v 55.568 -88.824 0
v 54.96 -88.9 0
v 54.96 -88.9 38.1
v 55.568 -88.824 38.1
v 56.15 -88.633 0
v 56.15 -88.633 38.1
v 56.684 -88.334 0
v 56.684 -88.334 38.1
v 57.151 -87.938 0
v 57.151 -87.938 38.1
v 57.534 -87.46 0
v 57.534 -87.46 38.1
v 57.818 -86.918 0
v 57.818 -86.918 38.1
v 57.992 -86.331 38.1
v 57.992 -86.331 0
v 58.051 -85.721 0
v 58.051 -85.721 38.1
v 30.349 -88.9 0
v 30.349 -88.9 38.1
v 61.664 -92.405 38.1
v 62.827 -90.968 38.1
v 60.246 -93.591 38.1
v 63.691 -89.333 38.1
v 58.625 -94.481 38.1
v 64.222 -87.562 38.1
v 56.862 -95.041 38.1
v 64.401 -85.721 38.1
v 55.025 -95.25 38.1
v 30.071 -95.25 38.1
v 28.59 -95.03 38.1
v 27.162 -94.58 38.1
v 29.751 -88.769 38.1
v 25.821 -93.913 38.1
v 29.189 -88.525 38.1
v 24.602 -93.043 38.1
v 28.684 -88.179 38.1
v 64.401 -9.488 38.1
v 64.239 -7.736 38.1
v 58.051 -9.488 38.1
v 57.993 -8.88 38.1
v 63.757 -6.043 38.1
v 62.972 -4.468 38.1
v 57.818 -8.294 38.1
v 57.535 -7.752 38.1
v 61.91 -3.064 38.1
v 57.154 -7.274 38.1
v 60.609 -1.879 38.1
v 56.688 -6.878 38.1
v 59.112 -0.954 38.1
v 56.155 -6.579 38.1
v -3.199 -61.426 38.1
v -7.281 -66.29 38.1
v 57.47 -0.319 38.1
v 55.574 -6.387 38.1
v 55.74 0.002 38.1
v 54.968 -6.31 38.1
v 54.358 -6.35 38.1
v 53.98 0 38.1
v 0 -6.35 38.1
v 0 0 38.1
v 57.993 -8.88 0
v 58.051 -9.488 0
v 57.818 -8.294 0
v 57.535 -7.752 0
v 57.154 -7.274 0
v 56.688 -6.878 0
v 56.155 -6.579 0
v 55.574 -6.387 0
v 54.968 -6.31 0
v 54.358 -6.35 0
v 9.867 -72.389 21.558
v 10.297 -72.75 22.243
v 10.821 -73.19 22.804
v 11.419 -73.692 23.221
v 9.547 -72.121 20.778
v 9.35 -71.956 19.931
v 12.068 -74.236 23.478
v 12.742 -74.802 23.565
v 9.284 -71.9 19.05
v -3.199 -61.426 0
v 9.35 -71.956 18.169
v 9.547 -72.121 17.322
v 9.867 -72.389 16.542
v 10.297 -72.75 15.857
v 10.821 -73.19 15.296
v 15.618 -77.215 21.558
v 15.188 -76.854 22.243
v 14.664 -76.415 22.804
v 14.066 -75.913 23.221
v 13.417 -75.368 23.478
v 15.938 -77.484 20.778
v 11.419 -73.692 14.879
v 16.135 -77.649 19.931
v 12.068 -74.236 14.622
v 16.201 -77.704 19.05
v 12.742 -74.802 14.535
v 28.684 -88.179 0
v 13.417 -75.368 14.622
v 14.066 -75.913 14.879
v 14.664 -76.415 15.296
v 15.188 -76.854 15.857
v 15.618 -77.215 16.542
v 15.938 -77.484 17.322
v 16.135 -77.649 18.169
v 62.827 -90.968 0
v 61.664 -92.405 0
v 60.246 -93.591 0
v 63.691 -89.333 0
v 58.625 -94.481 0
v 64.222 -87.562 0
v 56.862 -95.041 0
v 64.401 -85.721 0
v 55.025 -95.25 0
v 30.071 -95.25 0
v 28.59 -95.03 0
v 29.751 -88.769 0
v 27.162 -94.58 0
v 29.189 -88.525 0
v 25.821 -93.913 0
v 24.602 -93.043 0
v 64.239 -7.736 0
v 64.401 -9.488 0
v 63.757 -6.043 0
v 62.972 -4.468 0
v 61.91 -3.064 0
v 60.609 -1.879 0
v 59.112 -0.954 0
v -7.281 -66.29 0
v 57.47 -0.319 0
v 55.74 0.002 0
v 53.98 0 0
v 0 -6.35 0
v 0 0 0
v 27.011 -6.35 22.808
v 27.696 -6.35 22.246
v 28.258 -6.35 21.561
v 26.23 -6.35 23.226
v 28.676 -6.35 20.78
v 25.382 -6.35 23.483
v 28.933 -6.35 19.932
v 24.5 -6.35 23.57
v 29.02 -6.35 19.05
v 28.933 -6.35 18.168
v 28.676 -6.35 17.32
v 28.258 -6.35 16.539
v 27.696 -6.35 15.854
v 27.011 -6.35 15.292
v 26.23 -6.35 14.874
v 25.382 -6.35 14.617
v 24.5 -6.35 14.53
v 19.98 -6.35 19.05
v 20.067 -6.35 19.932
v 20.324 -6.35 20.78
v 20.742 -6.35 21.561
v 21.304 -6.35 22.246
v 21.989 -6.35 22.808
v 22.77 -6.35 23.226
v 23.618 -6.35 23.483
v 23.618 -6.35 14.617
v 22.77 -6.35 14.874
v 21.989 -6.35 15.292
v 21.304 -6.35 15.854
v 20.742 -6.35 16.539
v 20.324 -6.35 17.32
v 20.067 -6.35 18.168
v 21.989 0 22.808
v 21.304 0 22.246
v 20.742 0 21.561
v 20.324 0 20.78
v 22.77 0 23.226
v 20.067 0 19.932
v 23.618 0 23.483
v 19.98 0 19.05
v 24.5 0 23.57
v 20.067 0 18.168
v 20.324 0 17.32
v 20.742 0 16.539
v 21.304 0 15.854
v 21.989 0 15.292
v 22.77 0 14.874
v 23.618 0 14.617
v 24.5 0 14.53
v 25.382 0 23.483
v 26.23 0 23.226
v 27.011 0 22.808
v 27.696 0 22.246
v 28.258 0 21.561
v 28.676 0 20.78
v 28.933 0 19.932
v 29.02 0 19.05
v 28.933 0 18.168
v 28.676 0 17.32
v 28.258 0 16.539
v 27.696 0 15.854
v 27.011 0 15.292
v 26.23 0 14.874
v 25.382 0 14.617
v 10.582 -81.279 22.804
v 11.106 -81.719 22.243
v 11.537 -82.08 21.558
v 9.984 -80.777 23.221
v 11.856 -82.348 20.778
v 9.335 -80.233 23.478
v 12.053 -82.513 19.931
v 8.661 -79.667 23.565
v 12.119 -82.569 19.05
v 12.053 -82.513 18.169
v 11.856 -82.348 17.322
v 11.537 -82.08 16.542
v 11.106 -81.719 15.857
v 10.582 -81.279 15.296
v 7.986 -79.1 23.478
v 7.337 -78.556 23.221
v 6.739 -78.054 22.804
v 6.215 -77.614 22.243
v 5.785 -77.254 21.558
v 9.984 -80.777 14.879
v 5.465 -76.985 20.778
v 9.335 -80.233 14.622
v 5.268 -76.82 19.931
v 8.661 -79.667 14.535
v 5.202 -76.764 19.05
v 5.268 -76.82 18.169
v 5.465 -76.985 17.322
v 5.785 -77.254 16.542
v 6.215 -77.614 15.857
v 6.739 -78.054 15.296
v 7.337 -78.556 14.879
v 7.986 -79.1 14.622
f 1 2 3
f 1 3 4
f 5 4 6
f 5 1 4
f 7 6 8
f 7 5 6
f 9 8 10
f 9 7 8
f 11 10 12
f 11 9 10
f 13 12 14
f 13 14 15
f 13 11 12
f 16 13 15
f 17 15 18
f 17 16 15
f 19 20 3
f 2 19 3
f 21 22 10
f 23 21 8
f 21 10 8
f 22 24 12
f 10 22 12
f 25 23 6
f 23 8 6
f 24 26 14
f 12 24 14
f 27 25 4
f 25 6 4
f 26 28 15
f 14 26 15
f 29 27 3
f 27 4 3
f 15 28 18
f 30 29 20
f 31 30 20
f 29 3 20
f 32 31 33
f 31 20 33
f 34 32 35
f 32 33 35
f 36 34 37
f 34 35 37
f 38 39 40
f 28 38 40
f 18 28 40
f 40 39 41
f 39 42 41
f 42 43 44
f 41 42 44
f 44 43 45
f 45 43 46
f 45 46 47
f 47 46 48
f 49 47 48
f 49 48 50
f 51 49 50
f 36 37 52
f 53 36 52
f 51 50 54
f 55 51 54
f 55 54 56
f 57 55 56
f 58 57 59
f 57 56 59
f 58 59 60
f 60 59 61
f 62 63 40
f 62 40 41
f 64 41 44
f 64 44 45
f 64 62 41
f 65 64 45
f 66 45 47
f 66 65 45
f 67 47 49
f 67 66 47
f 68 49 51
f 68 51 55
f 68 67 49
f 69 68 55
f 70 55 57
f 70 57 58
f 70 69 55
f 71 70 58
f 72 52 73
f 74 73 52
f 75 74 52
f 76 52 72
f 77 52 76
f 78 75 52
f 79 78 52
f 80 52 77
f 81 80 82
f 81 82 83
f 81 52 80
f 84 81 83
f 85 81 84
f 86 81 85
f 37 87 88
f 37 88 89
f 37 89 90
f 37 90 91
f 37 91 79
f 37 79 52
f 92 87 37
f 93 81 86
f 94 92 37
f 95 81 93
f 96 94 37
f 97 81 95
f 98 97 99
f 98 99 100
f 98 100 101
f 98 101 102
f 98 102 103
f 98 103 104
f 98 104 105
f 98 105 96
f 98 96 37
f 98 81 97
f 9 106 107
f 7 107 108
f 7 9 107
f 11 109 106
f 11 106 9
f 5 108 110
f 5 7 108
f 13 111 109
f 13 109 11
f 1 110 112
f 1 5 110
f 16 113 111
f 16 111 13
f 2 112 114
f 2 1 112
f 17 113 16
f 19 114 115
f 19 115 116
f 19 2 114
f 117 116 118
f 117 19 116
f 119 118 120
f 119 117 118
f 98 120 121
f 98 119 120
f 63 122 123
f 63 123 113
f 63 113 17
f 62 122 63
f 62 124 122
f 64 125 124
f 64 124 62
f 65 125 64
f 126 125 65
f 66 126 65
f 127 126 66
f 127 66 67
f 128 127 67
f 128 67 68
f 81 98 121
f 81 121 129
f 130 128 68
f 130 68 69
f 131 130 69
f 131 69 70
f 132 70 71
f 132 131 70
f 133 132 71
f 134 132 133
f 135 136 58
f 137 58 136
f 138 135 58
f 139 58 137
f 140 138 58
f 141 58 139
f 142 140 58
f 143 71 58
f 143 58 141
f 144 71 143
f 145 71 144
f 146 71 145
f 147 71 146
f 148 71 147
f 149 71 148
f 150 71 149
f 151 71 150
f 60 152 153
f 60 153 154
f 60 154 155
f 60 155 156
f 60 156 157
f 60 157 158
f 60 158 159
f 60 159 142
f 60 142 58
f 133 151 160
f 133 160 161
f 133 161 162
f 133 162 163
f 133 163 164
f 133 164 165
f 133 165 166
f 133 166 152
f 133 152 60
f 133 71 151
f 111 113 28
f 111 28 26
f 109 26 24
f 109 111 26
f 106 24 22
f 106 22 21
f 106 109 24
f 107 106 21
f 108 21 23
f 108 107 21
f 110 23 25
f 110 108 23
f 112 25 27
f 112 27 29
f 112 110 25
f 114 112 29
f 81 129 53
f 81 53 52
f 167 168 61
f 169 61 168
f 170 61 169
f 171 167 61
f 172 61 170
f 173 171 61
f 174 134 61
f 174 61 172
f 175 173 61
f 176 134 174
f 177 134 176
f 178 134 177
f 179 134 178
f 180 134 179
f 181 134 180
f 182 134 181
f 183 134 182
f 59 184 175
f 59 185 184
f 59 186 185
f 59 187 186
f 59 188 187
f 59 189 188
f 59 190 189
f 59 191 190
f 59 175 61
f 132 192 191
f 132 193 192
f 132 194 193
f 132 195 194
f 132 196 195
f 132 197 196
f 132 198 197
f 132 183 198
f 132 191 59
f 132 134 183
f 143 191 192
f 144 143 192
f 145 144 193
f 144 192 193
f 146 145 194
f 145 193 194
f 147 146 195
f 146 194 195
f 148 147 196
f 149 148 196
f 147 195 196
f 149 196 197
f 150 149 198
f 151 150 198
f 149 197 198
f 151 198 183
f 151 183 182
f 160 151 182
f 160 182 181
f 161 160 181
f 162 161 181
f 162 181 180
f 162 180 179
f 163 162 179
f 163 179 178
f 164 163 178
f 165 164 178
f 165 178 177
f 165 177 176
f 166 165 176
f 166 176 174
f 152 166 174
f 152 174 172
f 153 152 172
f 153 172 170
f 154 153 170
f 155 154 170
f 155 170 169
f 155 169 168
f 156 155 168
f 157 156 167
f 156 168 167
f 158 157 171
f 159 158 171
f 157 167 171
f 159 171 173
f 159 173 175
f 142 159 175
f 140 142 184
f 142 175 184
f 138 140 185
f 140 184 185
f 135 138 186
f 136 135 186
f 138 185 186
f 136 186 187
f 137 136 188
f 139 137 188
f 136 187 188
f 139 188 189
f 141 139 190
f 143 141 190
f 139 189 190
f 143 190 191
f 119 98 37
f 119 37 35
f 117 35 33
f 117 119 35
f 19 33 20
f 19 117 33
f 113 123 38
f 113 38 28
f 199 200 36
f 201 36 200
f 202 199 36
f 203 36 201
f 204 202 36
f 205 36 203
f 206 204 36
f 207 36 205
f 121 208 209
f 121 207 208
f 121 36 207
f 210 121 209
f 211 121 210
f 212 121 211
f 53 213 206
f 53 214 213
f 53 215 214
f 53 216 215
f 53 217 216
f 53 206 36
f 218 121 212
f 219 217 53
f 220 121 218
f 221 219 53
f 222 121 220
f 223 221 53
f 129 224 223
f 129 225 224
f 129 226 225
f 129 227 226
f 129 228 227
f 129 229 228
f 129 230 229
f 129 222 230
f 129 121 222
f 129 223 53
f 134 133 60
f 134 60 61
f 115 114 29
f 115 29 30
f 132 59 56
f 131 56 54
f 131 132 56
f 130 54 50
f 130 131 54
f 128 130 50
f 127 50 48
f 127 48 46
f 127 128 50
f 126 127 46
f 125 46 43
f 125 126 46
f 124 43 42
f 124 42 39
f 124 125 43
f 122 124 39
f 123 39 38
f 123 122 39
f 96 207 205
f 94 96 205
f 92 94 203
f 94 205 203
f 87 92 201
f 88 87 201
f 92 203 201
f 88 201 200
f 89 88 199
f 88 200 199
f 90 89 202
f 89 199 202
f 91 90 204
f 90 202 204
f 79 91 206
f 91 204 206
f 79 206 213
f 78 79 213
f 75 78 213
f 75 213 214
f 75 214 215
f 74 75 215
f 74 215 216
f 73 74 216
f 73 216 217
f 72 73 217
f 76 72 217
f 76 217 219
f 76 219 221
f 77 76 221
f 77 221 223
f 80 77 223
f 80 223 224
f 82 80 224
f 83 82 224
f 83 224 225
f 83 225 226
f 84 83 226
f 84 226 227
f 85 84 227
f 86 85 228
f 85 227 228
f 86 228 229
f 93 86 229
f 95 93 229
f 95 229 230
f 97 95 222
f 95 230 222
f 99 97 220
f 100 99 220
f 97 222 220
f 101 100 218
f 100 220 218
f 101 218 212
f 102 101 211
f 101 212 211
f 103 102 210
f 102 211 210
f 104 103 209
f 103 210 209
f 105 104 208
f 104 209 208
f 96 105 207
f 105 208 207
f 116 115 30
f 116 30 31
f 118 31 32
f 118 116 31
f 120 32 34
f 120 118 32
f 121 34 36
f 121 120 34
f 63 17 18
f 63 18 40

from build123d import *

# Parameters (mm, degrees)
BOSS_EXTRUDE1_DEPTH = 38.1
SKETCH2_R           = 4.52
CUT_EXTRUDE1_DEPTH  = 38.1
SKETCH3_R           = 4.515
CUT_EXTRUDE2_DEPTH  = 10


with BuildPart() as part:
    # Sketch1 → Boss-Extrude1 (new body)
    with BuildSketch(Plane.XY):
        with BuildLine():
            Line((0, 0), (53.98, 0))
            ThreePointArc((53.98, 0), (61.287211447, -2.441393787), (64.401363743, -9.488222735))
            Line((64.401363743, -9.488222735), (64.401363743, -85.721240556))
            ThreePointArc((64.401363743, -85.721240556), (61.664237719, -92.40538322), (55.025128035, -95.25))
            Line((55.025128035, -95.25), (30.071323434, -95.25))
            ThreePointArc((30.071323434, -95.25), (27.161692752, -94.580250085), (24.602099349, -93.043045718))
            Line((24.602099349, -93.043045718), (-7.280670374, -66.290225402))
            Line((-7.280670374, -66.290225402), (-3.198969052, -61.425843189))
            Line((-3.198969052, -61.425843189), (28.68380067, -88.178663504))
            ThreePointArc((28.68380067, -88.178663504), (29.463882201, -88.660646082), (30.349062467, -88.9))
            Line((30.349062467, -88.9), (54.96018039, -88.9))
            ThreePointArc((54.96018039, -88.9), (57.151148485, -87.938216318), (58.051363743, -85.721240556))
            Line((58.051363743, -85.721240556), (58.051363743, -9.488222735))
            ThreePointArc((58.051363743, -9.488222735), (56.930321756, -7.064776449), (54.357595252, -6.35))
            Line((54.357595252, -6.35), (0, -6.35))
            Line((0, -6.35), (0, 0))
        make_face()
    extrude(amount=BOSS_EXTRUDE1_DEPTH)

    # Sketch2 → Cut-Extrude1 (cut)
    with BuildSketch(Plane(origin=(0, 0, 0), x_dir=(1, 0, 0), z_dir=(0, 1, 0))):
        with Locations((24.5, -19.05)):
            Circle(SKETCH2_R)
    extrude(amount=-CUT_EXTRUDE1_DEPTH, mode=Mode.SUBTRACT)

    # Sketch3 → Cut-Extrude2 (cut)
    with BuildSketch(Plane(origin=(-35.649761578, -42.485731436, 0), x_dir=(0.766044443, -0.64278761, 0), z_dir=(-0.64278761, -0.766044443, 0))):
        with Locations((57.84321845, 19.05)):
            Circle(SKETCH3_R)
    extrude(amount=-CUT_EXTRUDE2_DEPTH, mode=Mode.SUBTRACT)


solid = part.part
